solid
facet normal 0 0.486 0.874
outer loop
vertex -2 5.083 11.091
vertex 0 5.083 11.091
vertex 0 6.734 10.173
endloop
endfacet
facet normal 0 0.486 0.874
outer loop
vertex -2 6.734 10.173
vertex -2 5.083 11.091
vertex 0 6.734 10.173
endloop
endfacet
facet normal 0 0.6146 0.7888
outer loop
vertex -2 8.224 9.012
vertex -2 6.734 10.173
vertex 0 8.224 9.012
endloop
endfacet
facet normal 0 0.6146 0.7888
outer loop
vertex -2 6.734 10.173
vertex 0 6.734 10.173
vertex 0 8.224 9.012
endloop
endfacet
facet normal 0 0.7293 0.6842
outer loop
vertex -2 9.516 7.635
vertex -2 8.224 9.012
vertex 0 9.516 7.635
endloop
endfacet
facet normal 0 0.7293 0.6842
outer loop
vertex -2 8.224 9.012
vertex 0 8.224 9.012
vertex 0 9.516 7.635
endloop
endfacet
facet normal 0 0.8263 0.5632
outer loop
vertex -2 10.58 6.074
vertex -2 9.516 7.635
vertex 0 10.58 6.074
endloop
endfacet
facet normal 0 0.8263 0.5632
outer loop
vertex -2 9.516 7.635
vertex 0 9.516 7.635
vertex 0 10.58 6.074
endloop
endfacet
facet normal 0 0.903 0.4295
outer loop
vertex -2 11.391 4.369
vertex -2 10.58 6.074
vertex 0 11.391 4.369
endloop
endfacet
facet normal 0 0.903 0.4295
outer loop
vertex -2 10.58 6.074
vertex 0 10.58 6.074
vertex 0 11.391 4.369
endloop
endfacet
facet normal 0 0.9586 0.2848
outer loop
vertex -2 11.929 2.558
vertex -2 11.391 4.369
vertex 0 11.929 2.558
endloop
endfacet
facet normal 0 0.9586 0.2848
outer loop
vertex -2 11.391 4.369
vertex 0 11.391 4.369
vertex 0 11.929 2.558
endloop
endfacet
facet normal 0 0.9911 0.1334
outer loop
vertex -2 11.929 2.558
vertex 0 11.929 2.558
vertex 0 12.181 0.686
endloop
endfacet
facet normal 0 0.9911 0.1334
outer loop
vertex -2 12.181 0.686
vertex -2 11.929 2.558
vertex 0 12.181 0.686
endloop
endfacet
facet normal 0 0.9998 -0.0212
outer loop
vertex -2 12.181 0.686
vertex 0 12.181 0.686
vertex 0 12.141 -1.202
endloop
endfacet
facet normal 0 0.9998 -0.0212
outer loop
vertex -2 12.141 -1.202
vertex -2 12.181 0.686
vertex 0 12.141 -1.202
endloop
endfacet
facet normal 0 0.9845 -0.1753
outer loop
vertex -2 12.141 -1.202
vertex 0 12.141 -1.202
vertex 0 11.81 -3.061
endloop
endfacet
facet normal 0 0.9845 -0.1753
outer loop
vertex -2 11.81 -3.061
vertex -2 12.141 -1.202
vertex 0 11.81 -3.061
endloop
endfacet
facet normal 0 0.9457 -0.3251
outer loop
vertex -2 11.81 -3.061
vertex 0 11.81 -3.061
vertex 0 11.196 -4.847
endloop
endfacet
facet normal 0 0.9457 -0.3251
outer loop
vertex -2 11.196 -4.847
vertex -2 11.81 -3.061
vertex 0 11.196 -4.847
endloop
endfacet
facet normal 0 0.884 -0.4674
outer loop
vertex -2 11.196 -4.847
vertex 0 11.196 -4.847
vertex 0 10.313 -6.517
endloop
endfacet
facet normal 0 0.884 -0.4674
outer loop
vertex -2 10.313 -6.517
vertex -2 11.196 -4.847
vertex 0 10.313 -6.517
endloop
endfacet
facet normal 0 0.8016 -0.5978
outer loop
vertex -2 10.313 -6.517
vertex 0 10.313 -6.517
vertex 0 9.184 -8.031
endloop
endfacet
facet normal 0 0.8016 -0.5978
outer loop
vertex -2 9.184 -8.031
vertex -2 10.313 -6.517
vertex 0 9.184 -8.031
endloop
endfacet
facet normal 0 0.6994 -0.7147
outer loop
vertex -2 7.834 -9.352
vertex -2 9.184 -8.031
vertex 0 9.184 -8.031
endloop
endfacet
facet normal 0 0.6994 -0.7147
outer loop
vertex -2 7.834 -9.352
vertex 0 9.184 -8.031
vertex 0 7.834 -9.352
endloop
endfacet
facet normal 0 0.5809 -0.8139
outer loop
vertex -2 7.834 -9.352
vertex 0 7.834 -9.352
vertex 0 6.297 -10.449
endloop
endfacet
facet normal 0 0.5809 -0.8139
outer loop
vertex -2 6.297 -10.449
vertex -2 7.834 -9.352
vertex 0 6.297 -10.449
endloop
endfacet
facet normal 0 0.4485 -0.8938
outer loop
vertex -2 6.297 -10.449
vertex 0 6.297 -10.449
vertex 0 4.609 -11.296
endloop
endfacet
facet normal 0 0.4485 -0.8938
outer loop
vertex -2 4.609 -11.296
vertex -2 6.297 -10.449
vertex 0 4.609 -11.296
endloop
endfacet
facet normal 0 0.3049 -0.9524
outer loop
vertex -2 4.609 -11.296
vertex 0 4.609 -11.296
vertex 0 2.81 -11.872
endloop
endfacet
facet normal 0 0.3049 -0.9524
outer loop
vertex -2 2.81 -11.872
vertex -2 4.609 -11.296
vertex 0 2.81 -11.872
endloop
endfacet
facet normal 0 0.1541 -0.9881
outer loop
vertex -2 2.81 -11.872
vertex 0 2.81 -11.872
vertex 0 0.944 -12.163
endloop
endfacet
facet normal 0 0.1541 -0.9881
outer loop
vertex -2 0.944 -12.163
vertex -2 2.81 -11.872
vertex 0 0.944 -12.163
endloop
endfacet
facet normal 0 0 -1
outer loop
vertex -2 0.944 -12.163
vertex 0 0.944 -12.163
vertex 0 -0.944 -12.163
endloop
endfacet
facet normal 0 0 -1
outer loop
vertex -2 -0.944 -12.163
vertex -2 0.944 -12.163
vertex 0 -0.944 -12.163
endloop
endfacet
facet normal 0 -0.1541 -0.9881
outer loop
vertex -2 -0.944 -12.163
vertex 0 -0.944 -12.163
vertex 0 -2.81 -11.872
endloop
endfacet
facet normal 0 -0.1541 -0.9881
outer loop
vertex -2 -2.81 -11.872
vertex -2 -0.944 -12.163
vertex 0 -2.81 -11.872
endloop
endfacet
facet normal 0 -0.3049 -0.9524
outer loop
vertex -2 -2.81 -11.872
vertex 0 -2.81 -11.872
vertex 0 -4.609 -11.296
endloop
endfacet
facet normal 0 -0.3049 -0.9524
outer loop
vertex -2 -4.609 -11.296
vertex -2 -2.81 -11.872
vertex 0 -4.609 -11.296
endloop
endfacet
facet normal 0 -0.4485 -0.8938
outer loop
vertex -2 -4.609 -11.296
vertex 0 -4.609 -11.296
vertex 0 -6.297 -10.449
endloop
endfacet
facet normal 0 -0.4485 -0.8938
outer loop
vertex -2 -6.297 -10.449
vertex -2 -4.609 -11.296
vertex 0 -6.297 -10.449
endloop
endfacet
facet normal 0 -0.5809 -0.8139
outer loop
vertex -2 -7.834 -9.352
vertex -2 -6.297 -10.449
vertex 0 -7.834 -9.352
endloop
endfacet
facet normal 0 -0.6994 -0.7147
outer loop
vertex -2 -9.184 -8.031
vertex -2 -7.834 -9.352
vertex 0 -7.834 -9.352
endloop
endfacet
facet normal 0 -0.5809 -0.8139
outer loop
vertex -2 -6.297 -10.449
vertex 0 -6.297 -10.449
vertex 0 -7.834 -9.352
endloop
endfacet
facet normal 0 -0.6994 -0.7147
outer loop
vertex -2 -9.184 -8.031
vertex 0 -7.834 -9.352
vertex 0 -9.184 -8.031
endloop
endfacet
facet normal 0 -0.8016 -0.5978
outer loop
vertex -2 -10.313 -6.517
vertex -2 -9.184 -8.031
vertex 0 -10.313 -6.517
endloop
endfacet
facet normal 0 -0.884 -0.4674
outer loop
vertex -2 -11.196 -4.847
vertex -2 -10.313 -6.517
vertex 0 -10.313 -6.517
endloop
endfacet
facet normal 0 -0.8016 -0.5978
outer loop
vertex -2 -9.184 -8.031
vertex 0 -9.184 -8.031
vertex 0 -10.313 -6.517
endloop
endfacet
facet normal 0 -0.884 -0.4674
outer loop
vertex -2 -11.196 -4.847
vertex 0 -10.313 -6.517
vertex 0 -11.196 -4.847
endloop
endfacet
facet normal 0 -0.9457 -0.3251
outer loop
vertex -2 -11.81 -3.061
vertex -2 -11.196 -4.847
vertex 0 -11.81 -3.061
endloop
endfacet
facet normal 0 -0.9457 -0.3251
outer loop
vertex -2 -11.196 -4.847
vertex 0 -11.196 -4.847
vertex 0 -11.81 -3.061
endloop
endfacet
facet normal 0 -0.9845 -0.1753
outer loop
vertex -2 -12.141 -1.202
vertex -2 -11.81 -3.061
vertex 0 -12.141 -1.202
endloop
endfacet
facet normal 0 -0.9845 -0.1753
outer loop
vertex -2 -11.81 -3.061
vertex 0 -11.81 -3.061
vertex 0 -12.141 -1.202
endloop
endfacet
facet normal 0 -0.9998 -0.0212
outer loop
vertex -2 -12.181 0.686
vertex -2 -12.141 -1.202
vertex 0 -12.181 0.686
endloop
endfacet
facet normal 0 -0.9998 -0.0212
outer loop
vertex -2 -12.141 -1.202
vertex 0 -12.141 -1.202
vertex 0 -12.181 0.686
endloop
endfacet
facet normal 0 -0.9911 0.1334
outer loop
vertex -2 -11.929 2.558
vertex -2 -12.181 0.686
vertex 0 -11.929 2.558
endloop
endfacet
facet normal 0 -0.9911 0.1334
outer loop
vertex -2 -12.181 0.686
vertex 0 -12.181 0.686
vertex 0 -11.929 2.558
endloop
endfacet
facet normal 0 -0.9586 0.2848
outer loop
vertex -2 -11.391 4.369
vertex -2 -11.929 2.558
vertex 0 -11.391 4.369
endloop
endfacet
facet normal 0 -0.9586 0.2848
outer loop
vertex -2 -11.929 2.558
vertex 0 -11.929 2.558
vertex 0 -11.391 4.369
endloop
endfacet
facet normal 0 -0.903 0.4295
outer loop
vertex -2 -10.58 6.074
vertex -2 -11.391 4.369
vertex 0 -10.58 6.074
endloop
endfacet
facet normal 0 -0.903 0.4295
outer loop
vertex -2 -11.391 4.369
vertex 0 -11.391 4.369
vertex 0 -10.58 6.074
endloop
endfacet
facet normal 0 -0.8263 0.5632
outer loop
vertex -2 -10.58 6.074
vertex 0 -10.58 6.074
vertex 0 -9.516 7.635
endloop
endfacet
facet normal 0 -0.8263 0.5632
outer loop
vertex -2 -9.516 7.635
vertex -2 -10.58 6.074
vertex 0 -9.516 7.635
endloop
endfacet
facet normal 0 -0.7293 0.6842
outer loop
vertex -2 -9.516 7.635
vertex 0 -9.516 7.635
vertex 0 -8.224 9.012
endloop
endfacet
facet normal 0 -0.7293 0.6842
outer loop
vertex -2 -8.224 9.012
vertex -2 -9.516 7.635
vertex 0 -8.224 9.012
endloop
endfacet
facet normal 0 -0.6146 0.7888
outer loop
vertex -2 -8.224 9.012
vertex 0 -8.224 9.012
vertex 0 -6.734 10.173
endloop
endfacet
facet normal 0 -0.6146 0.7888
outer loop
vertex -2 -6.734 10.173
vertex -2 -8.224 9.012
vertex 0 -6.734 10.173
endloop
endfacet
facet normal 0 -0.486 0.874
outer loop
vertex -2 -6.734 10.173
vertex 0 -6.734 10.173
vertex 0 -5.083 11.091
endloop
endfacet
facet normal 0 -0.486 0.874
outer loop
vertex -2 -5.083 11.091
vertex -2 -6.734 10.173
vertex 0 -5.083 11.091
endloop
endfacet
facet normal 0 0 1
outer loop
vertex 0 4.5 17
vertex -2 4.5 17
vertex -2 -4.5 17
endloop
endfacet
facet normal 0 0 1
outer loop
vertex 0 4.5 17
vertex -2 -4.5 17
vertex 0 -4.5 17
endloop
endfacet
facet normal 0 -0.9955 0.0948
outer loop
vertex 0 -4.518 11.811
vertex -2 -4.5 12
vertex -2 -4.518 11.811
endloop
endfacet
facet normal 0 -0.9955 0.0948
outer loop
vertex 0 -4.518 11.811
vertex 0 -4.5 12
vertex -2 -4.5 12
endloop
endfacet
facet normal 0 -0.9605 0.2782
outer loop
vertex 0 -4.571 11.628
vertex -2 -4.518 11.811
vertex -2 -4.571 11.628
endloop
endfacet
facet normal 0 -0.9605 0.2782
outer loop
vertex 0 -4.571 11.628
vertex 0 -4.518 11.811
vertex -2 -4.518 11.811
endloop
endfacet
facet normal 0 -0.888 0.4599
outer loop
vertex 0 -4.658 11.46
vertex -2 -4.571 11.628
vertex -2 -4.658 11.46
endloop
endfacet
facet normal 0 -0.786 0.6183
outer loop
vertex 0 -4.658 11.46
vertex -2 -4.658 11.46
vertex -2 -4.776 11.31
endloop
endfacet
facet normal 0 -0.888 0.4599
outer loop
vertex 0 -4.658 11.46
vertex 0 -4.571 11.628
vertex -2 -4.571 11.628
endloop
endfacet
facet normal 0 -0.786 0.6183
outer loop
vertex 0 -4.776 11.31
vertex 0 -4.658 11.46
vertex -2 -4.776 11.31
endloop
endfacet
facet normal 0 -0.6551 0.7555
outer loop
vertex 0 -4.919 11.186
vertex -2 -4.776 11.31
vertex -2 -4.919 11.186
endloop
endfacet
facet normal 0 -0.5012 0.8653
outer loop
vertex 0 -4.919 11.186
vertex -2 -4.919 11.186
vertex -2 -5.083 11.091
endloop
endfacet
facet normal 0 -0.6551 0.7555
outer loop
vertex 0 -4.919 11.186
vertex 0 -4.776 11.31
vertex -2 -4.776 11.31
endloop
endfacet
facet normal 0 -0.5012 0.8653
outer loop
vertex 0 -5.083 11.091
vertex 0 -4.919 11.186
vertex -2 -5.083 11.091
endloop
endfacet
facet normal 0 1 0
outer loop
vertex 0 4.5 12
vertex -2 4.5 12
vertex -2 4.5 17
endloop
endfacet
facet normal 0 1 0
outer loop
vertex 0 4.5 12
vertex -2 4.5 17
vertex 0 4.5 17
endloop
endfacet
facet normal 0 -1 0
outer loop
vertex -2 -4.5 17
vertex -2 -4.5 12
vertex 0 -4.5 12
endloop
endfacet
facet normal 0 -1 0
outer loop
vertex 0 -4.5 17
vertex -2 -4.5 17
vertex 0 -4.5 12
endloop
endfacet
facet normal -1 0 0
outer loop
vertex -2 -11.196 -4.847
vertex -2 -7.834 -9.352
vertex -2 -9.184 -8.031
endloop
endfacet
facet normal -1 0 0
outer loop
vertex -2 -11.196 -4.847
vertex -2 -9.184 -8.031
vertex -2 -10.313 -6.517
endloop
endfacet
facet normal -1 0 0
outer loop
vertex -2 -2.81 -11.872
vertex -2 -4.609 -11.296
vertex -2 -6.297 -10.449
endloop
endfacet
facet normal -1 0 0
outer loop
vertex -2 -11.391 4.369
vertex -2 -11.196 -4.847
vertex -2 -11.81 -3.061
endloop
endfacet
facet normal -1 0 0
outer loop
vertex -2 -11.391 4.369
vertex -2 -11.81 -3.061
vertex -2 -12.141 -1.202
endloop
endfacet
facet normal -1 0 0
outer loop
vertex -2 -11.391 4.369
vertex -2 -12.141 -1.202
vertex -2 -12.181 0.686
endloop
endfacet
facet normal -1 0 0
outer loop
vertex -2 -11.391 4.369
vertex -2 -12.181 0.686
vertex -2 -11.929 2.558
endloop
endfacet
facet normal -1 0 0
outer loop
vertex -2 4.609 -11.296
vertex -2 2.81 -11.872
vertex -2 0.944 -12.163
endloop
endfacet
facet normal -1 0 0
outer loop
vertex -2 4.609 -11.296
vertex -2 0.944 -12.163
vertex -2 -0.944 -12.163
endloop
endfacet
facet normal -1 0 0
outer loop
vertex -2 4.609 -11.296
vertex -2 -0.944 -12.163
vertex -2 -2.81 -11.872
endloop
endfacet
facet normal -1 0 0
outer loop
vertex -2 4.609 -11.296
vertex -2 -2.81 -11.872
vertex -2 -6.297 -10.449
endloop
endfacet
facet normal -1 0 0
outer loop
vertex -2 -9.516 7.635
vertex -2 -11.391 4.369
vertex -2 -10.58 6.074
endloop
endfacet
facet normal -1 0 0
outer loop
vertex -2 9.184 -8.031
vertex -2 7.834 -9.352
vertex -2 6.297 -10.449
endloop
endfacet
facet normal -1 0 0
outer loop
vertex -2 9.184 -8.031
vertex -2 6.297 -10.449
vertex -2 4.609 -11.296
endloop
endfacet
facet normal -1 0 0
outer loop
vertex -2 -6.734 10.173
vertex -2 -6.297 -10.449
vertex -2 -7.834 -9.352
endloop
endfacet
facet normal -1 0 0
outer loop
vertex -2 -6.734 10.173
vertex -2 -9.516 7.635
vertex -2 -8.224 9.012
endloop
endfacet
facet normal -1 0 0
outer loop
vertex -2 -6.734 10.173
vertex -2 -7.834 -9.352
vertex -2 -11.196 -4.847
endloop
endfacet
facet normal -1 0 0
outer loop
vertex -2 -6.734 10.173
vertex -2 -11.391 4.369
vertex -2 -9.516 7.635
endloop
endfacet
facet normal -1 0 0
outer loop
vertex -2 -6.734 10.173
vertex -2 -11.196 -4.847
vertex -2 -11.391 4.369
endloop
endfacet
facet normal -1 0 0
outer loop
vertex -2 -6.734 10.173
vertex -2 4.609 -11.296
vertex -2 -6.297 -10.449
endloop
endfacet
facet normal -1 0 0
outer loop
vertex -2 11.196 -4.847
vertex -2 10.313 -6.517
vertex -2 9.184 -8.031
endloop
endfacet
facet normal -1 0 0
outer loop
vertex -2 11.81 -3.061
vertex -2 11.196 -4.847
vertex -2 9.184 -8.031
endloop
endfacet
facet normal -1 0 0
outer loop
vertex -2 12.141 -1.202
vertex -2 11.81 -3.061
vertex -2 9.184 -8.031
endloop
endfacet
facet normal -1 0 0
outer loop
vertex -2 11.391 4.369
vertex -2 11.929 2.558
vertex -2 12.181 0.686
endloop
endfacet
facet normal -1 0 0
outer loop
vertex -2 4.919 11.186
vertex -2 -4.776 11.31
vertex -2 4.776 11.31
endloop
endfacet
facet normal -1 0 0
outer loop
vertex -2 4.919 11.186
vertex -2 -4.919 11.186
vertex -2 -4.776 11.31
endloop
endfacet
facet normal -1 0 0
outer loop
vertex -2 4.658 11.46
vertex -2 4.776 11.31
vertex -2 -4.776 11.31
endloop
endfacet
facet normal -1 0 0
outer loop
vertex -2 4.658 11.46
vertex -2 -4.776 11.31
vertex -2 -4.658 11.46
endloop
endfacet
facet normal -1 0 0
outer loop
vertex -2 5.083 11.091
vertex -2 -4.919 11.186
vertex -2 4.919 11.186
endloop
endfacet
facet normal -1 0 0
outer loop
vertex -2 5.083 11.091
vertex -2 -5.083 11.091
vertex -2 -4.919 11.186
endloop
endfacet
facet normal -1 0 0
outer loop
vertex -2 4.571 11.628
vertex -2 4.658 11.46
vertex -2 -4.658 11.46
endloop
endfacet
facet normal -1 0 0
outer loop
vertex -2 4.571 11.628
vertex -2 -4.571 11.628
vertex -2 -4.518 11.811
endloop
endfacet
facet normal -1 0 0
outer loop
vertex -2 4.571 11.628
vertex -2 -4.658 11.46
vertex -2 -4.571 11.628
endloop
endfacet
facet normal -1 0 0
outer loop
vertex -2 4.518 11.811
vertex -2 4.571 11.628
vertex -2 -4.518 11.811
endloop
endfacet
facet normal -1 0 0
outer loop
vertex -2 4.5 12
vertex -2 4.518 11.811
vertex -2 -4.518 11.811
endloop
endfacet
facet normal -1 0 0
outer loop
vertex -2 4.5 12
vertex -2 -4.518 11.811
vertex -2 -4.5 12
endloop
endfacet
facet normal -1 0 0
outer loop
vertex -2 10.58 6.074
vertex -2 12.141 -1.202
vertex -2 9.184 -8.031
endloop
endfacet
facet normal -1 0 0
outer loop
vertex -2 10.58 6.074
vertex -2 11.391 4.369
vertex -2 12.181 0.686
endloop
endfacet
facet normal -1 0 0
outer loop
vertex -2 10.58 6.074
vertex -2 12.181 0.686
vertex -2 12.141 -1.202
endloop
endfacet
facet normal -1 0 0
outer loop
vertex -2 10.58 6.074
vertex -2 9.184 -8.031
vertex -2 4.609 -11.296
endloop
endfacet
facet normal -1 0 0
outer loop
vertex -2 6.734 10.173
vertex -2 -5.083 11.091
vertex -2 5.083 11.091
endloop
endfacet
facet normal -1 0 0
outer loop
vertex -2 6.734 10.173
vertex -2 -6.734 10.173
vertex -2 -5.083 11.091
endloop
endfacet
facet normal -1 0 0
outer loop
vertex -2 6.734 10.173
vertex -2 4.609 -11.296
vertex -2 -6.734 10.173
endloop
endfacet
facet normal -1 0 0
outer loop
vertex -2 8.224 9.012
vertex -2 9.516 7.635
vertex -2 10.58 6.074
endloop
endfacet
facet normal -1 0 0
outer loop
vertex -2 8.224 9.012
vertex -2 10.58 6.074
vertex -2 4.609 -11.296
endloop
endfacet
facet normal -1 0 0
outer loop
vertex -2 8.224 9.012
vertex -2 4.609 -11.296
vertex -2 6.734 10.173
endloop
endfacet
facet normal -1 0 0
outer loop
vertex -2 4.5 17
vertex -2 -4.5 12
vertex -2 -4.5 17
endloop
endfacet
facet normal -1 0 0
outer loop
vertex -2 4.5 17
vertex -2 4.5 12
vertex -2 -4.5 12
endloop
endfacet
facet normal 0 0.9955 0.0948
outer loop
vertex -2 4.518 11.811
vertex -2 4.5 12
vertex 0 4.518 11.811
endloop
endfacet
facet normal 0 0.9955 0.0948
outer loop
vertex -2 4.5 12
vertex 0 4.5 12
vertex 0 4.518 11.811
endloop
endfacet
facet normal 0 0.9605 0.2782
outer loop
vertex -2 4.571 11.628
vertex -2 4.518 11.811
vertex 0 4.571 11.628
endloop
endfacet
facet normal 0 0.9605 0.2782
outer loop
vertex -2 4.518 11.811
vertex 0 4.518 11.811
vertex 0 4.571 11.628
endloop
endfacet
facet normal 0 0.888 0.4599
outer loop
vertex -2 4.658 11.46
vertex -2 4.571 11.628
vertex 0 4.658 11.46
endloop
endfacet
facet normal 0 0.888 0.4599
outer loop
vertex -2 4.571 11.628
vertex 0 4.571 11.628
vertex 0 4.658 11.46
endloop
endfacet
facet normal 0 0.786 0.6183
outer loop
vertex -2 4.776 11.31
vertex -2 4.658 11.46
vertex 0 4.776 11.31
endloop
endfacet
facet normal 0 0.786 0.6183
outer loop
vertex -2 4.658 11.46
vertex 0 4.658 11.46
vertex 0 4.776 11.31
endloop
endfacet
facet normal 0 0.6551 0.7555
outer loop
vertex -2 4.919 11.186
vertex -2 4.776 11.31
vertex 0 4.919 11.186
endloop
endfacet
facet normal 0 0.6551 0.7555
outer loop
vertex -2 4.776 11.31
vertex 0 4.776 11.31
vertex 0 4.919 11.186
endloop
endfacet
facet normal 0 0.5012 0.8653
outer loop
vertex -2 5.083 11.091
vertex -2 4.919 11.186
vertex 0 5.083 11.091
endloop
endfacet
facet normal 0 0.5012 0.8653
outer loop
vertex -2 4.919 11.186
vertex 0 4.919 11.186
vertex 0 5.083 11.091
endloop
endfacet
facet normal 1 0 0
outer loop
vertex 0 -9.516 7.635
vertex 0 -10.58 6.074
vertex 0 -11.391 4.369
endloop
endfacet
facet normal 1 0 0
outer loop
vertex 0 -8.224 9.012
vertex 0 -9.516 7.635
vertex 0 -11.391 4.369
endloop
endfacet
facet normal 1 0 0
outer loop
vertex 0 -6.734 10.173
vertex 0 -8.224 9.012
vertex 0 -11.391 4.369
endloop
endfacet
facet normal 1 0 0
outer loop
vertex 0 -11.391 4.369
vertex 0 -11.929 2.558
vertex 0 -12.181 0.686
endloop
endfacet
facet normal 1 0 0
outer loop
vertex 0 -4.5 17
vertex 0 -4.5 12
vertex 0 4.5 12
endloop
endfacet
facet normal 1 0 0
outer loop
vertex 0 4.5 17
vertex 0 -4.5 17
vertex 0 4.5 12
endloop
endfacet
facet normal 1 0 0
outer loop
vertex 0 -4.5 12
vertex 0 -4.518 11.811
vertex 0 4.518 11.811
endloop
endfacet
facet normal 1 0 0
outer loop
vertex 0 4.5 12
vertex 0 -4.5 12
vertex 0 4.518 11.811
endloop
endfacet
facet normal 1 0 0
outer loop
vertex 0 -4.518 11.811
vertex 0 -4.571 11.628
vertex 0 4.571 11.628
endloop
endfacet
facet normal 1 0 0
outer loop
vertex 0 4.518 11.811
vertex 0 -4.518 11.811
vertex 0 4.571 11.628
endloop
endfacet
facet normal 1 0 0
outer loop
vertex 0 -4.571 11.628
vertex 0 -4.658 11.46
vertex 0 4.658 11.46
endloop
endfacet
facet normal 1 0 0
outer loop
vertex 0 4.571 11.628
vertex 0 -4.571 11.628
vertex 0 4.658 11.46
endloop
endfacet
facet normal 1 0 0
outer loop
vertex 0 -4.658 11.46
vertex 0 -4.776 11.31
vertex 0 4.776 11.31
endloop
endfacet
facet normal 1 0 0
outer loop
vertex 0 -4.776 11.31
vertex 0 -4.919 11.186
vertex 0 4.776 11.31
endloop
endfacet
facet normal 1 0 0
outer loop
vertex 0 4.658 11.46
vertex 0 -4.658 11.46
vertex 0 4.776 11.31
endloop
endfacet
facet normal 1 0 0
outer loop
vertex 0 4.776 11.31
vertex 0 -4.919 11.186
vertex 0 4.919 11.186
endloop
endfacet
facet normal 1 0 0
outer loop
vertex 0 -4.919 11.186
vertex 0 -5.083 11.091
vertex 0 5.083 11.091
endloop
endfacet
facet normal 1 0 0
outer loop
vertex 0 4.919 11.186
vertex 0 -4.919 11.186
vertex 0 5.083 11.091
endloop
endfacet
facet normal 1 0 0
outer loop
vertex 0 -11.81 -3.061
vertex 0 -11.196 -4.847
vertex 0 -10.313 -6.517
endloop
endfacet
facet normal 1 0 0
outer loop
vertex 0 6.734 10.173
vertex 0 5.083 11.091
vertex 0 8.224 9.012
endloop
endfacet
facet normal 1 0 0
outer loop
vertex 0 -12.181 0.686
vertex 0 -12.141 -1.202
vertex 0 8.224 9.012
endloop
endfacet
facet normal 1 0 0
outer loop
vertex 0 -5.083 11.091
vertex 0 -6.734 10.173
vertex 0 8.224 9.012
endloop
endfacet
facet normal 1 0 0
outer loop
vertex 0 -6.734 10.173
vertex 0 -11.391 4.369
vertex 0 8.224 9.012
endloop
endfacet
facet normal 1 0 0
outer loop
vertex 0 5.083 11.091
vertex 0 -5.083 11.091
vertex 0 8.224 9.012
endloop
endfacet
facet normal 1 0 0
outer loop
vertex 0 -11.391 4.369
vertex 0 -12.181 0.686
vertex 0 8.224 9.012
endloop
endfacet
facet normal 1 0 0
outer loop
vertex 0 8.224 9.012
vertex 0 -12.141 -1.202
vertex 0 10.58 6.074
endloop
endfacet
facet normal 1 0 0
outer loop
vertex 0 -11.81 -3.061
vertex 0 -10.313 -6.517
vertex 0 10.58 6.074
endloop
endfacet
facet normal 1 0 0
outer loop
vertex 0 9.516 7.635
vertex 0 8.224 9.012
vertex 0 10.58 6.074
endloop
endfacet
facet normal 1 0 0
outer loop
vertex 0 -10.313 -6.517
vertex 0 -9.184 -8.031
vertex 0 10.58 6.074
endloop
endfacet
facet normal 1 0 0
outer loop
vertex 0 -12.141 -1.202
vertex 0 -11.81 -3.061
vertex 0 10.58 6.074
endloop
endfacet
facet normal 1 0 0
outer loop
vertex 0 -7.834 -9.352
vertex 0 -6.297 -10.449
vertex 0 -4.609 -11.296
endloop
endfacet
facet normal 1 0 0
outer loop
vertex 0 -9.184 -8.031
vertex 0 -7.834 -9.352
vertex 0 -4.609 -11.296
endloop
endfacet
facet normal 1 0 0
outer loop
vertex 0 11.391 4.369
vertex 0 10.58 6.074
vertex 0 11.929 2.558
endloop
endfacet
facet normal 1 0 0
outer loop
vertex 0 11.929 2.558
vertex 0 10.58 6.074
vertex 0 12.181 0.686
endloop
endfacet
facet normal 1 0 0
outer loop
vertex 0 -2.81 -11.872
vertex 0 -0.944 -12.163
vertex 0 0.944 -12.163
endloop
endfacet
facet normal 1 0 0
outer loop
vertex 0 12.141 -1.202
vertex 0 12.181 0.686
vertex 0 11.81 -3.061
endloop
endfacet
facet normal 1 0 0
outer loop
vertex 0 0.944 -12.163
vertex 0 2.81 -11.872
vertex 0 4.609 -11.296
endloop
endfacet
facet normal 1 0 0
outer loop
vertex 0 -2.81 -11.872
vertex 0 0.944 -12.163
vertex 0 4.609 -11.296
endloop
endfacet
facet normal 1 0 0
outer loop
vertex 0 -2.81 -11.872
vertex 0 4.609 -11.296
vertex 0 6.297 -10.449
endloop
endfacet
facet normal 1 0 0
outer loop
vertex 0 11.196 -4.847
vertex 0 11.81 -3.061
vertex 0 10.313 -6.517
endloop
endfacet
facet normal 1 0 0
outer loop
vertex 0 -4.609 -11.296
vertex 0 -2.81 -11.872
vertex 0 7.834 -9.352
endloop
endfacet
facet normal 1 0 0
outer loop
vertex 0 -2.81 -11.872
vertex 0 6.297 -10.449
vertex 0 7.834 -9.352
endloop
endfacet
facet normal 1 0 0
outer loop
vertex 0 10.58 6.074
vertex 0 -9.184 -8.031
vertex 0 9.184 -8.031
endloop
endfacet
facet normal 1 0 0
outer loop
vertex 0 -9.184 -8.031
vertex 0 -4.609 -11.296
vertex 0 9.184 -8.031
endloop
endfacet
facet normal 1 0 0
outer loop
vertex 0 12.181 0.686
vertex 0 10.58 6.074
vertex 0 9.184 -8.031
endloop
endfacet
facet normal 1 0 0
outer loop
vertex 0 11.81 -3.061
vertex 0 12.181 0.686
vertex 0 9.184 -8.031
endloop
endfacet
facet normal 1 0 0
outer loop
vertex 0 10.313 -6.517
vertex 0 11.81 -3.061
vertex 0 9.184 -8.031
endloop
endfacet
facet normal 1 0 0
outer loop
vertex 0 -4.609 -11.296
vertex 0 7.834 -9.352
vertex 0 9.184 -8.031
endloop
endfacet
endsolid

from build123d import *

# Parameters (mm, degrees)
SKETCH_1_W      = 2
SKETCH_1_H      = 12.2
SKETCH_2_W      = 2
SKETCH_2_H      = 9
EXTRUDE_1_DEPTH = 17
FILLET_3_R      = 1


with BuildPart() as part:
    # 草图1 → 旋转1 (revolve)
    with BuildSketch(Plane(origin=(0, 0, 0), x_dir=(1, 0, 0), z_dir=(0, 1, 0))):
        with Locations((-1, -6.1)):
            Rectangle(SKETCH_1_W, SKETCH_1_H)
    revolve(axis=Axis((0, 0, 0), (-1, 0, 0)))

    # 草图2 → 凸台-拉伸1 (add)
    with BuildSketch(Plane.XY):
        with Locations((-1, 0)):
            Rectangle(SKETCH_2_W, SKETCH_2_H)
    extrude(amount=EXTRUDE_1_DEPTH)

    # 圆角3
    fillet_3_edges = [part.edges().sort_by_distance(p)[0] for p in [
        (-1, -4.5, 11.339753084),
        (-1, 4.5, 11.339753084),
    ]]
    fillet(fillet_3_edges, radius=FILLET_3_R)


solid = part.part
